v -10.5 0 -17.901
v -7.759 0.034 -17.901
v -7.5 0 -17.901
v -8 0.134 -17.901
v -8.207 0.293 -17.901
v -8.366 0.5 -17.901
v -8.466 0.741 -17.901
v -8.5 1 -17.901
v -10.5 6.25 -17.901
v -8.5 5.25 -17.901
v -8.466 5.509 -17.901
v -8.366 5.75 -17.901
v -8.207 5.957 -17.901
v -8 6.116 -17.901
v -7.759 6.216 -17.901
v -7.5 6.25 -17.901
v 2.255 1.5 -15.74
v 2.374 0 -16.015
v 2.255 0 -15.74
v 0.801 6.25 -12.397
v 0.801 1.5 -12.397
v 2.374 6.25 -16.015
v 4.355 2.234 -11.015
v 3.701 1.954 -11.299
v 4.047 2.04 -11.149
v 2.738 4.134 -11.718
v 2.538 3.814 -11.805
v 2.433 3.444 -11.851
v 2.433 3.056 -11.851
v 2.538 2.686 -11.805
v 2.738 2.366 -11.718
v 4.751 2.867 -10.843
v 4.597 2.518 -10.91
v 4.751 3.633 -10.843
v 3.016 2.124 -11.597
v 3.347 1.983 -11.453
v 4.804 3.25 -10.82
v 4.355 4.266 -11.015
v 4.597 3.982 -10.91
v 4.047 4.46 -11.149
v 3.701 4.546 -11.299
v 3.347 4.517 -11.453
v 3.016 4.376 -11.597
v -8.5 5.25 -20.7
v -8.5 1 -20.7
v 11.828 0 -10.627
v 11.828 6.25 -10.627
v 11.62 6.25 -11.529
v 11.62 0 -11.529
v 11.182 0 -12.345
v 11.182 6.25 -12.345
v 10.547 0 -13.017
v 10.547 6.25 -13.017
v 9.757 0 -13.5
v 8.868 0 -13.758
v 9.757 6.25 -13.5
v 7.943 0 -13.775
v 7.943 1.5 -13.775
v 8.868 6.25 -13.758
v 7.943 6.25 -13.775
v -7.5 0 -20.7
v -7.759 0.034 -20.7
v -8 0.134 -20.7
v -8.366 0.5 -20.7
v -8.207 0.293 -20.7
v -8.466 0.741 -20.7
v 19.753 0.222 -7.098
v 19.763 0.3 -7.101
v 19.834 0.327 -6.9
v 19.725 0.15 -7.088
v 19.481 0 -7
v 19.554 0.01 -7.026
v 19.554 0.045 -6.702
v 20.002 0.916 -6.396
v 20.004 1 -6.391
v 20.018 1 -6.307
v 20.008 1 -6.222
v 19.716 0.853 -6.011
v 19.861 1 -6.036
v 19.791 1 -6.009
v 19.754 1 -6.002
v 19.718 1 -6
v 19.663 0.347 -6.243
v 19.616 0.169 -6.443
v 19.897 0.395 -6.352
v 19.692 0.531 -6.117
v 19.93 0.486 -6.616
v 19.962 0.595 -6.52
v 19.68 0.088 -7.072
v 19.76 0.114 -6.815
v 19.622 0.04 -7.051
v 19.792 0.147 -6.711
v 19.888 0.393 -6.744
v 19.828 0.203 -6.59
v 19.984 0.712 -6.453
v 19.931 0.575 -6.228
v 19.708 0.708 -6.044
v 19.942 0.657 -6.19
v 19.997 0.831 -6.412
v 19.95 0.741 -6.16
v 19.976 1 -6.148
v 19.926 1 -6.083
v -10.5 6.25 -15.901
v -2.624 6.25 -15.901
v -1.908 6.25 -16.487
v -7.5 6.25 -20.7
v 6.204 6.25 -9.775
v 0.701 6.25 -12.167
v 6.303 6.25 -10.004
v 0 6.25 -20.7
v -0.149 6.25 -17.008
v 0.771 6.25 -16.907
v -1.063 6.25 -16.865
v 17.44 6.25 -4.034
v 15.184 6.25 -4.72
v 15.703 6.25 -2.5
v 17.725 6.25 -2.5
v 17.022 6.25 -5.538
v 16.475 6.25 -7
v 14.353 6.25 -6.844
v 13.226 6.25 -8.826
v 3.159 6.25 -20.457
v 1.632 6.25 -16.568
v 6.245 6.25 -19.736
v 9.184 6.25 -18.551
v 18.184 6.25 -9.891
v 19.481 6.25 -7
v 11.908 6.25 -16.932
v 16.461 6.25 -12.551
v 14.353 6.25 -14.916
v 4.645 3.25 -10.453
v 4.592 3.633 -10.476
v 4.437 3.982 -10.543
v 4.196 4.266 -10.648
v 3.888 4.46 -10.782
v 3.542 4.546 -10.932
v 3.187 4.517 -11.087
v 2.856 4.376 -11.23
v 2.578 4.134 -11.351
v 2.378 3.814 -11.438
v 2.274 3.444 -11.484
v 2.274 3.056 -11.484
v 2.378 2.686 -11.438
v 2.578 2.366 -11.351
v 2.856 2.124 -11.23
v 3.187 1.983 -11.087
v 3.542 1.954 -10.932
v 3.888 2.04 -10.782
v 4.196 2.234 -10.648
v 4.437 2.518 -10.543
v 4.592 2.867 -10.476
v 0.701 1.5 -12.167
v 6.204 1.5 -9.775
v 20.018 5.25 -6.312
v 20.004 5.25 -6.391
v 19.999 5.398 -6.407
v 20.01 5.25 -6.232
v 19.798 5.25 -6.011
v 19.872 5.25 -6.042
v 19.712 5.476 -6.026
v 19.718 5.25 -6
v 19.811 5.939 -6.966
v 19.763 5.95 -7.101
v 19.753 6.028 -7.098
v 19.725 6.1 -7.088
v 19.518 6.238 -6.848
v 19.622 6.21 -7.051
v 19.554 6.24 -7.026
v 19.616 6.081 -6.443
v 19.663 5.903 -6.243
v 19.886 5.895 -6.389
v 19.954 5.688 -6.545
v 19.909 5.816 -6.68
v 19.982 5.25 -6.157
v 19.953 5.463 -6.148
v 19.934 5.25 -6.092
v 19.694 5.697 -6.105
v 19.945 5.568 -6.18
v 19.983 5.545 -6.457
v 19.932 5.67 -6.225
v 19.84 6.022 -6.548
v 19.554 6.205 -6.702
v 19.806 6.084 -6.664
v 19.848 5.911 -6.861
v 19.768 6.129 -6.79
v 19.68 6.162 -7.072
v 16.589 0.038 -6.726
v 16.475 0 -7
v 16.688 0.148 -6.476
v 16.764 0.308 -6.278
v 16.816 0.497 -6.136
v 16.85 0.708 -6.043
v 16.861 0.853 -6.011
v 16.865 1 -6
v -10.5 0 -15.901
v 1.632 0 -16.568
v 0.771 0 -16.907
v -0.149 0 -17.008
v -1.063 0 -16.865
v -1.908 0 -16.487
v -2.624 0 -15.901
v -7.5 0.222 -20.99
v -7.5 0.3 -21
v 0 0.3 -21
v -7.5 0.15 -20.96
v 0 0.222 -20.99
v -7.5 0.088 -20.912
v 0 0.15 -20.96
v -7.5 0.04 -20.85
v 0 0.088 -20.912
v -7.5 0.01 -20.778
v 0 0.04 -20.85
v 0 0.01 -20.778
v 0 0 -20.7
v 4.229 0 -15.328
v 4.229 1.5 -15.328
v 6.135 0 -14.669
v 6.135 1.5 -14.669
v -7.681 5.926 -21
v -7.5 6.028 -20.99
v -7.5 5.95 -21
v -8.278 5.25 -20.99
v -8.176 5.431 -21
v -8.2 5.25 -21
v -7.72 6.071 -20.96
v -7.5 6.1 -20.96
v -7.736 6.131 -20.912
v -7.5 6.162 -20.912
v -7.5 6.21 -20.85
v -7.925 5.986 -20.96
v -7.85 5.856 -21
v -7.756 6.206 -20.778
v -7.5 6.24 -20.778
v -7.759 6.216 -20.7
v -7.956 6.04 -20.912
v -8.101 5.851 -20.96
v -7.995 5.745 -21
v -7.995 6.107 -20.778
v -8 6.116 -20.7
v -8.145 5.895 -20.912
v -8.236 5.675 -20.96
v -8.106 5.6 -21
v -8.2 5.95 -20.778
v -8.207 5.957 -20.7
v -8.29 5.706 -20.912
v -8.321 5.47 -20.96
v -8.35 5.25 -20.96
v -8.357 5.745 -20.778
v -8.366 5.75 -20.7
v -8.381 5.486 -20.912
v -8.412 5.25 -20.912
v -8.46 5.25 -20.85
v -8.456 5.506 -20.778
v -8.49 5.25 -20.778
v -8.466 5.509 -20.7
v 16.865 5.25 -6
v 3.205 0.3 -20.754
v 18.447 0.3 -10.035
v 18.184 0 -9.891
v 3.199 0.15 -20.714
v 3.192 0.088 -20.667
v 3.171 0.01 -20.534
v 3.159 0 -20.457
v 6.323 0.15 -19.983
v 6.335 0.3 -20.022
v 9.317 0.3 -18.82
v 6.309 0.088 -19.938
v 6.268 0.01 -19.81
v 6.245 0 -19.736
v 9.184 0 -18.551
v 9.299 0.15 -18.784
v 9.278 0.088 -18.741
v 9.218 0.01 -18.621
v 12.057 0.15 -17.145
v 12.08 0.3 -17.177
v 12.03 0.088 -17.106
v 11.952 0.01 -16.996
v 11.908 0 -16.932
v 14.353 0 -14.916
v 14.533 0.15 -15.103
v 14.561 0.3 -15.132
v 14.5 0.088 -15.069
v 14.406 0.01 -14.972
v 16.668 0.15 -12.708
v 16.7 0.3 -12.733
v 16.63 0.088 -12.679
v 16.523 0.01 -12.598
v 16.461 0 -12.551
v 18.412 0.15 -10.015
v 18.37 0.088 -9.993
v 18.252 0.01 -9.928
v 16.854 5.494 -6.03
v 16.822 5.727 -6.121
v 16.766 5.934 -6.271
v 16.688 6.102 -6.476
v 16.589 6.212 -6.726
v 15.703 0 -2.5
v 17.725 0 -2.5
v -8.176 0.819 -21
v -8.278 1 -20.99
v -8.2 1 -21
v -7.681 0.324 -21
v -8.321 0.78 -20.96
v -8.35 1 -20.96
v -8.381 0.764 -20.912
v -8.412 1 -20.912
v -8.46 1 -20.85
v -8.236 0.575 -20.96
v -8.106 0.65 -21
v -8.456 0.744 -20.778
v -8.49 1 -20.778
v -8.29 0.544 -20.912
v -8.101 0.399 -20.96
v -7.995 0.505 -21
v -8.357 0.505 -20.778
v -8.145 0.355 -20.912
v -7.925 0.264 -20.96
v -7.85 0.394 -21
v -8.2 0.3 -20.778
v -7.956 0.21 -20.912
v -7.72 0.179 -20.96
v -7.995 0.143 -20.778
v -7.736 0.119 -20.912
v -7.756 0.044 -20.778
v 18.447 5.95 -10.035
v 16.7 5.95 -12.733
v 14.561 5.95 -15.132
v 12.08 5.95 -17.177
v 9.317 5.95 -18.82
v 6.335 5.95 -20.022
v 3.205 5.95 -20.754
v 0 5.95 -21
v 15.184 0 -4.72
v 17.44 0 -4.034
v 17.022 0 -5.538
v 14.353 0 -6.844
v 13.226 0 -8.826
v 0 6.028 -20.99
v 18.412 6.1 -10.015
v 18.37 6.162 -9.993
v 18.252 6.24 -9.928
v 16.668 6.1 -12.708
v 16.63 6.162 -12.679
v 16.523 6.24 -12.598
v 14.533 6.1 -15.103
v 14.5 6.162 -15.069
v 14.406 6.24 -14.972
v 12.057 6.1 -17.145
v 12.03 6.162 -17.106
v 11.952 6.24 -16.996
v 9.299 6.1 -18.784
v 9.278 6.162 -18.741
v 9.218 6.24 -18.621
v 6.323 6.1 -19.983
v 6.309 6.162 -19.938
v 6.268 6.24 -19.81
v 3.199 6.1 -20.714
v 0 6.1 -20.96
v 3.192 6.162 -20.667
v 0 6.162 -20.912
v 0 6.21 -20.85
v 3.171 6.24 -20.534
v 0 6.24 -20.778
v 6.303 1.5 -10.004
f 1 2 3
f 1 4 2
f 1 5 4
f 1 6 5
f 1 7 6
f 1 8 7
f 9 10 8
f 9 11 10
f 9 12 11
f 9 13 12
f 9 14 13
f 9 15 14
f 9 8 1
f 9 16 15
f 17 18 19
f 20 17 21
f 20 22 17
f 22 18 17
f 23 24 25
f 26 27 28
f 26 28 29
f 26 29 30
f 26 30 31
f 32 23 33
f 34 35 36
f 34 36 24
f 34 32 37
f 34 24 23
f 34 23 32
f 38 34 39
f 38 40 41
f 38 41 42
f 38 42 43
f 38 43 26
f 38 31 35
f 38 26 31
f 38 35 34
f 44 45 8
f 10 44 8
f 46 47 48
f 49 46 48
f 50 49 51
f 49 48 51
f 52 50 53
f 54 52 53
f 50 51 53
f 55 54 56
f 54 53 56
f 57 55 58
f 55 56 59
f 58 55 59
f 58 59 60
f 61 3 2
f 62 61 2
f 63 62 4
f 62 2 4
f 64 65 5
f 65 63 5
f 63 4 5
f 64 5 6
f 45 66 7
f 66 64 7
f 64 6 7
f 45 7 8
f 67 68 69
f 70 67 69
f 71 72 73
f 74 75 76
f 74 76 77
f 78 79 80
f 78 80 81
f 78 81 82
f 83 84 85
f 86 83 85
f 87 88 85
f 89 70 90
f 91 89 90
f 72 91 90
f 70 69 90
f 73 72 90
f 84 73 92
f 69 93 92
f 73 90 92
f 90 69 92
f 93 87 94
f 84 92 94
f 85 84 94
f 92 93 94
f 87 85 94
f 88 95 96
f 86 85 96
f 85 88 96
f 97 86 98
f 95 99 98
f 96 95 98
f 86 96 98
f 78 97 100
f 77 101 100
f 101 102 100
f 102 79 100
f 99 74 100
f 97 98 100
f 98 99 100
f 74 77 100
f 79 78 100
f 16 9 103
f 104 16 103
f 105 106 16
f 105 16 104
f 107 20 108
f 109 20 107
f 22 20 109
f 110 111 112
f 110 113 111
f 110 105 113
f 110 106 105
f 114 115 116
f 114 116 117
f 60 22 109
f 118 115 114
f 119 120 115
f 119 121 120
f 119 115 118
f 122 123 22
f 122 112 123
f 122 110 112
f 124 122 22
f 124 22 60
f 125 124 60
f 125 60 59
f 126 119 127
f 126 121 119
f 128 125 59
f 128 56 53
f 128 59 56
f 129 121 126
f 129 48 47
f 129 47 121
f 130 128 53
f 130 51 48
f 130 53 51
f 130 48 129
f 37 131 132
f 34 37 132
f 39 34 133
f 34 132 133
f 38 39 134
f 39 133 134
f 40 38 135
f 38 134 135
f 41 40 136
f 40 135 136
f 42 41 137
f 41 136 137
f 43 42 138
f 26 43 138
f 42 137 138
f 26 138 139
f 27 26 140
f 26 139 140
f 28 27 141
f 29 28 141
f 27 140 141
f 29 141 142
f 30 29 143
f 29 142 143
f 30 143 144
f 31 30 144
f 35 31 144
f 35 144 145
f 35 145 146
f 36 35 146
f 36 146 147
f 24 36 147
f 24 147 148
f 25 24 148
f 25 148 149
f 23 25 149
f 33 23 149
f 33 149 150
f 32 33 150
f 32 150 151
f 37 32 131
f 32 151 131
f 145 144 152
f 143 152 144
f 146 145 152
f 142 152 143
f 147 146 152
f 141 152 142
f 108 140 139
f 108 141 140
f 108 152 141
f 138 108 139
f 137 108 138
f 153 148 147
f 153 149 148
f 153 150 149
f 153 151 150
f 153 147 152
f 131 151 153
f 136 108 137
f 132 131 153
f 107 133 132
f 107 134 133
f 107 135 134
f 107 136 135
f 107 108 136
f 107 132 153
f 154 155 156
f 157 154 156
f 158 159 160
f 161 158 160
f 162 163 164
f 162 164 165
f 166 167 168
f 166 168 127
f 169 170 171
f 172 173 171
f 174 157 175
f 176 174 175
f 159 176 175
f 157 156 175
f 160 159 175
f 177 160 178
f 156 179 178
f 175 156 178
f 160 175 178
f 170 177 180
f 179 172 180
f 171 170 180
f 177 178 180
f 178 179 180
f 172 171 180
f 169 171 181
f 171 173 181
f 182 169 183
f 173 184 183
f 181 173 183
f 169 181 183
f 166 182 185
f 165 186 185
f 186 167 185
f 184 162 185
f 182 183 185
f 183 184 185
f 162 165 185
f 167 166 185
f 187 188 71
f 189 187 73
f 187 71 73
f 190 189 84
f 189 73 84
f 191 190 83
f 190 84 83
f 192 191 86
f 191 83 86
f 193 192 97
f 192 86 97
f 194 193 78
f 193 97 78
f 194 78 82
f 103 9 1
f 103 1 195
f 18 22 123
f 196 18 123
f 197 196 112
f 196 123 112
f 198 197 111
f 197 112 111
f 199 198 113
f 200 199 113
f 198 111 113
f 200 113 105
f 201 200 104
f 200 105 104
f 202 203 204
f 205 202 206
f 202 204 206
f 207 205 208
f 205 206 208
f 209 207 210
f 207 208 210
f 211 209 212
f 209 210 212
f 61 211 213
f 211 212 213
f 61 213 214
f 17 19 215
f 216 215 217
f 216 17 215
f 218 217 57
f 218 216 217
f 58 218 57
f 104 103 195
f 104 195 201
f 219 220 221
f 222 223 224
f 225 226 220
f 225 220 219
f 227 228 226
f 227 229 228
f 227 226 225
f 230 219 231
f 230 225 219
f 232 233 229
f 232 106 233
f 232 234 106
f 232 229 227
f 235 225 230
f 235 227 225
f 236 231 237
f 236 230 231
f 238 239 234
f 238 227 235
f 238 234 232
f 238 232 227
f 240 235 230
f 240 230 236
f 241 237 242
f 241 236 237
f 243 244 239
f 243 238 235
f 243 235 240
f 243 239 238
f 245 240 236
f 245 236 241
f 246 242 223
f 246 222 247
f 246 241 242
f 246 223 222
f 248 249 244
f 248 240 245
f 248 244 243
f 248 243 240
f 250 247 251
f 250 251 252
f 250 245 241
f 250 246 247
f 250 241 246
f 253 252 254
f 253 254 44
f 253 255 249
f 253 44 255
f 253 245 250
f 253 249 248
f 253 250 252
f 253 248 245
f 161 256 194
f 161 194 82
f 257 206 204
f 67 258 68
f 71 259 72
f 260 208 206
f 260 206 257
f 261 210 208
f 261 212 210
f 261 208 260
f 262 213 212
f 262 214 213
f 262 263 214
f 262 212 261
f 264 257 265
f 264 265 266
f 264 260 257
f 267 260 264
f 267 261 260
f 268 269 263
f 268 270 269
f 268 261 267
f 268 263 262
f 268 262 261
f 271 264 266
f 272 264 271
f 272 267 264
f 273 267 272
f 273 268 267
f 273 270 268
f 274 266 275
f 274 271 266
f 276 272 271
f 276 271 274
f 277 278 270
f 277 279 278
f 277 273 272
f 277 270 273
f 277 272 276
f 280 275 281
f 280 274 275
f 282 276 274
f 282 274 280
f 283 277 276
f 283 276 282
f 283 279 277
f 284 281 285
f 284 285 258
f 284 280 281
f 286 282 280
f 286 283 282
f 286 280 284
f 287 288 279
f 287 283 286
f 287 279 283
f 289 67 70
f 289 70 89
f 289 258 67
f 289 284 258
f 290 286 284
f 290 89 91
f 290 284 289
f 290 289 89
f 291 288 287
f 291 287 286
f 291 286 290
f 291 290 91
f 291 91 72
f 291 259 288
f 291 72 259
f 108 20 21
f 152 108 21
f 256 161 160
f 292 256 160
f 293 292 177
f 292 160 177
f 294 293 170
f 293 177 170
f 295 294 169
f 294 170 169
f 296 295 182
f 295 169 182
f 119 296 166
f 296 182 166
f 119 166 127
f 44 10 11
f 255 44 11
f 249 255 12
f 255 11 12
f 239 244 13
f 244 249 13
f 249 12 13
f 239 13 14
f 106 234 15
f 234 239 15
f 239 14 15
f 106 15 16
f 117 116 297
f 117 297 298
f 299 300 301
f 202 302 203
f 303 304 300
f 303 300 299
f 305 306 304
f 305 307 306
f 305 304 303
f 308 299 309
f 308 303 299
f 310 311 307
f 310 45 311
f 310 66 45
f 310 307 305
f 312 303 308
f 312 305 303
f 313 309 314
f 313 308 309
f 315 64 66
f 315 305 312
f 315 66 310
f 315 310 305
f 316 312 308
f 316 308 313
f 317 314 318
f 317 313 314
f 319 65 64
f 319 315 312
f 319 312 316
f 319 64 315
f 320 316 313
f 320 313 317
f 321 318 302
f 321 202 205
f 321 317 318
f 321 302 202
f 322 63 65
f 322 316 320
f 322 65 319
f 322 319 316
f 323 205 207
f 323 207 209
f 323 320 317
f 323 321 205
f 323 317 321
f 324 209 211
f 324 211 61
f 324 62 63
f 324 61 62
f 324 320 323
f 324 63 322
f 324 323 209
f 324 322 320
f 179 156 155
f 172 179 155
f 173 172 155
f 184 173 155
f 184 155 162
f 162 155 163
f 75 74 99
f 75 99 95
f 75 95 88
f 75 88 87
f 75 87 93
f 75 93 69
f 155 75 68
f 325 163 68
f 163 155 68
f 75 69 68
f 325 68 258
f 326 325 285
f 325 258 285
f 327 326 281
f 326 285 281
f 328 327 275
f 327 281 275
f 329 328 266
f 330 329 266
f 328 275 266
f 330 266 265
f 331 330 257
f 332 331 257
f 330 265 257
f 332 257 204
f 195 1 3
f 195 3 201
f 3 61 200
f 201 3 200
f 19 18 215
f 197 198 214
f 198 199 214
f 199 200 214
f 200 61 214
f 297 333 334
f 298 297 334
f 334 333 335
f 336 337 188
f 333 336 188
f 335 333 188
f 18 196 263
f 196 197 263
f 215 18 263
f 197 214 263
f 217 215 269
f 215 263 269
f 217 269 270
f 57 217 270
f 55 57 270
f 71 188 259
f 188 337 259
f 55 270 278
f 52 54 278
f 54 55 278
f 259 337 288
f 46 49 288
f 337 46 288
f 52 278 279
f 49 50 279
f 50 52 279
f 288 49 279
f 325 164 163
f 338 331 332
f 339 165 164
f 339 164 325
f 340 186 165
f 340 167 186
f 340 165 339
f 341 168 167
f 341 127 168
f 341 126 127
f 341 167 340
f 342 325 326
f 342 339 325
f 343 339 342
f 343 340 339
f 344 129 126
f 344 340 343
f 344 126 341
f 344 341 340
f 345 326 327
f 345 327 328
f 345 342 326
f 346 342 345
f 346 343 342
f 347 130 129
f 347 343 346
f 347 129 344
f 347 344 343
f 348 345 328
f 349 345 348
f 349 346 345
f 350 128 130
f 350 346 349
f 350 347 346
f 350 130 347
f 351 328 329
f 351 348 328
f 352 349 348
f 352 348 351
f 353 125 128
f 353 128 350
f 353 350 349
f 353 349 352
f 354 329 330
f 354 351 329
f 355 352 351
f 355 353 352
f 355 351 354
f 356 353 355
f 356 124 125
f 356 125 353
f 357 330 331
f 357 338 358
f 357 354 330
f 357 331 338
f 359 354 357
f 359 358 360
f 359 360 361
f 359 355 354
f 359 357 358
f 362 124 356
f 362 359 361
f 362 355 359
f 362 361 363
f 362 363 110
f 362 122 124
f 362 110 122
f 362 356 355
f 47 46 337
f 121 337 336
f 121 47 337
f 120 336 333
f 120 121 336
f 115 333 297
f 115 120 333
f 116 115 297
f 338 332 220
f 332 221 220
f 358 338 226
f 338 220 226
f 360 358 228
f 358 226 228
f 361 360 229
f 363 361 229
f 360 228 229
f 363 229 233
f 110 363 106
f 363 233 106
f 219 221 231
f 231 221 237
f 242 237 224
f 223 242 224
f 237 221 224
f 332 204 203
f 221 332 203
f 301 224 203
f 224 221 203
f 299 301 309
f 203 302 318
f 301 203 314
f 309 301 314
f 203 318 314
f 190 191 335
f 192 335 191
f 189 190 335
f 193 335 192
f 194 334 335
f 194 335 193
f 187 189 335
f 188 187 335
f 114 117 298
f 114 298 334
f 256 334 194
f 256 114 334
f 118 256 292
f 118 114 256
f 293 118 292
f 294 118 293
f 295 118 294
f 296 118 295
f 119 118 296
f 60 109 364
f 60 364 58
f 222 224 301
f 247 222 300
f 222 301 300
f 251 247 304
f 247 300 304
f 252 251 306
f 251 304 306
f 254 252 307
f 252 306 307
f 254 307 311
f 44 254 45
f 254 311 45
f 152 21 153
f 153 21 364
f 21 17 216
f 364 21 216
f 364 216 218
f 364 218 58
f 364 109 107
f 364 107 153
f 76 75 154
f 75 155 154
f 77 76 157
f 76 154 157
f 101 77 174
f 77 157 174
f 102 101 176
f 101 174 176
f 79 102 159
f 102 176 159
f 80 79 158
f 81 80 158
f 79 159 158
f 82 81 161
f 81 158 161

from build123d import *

# Parameters (mm, degrees)
BOSS_EXTRUDE1_DEPTH = 6.25
CUT_EXTRUDE1_DEPTH  = 10
BOSS_EXTRUDE2_DEPTH = 6.25
CUT_EXTRUDE2_START  = -1.5
CUT_EXTRUDE2_DEPTH  = 1.5
MOVE_FACE1_BY       = 0.25
SKETCH5_R           = 1.3
CUT_EXTRUDE3_DEPTH  = 0.4
BOSS_EXTRUDE3_DEPTH = 6.25
MOVE_FACE2_BY       = 0.5
MOVE_FACE2_2_BY     = 0.5
CUT_EXTRUDE4_DEPTH  = 13
CUT_EXTRUDE5_START  = -1.5
CUT_EXTRUDE5_DEPTH  = 1.5
BOSS_EXTRUDE4_DEPTH = 6.25
CUT_EXTRUDE6_DEPTH  = 9.000000000000002
FILLET1_R           = 1
FILLET2_R           = 0.3


with BuildPart() as part:
    # Sketch1 → Boss-Extrude1 (new body)
    with BuildSketch(Plane(origin=(0, 0, 0), x_dir=(1, 0, 0), z_dir=(0, 1, 0))):
        with BuildLine():
            Line((-8.500000000000007, 21.49999999999999), (-8.500000000000007, 15.499999999999982))
            Line((-8.500000000000007, 15.499999999999982), (16.645822822062563, 5.999999999999995))
            Line((16.645822822062563, 5.999999999999995), (20.645822822062566, 5.999999999999995))
            ThreePointArc((20.645822822062566, 5.999999999999995), (12.90833064342558, 17.19374886404939), (0, 21.49999999999999))
            Line((0, 21.49999999999999), (-8.500000000000007, 21.49999999999999))
        make_face()
    extrude(amount=BOSS_EXTRUDE1_DEPTH)

    # Sketch2 → Cut-Extrude1 (cut)
    with BuildSketch(Plane(origin=(0, 6.25, 0), x_dir=(1, 0, 0), z_dir=(0, 1, 0))):
        with BuildLine():
            Line((-9.752670250943163, 2.7674418604651105), (-9.752670250943163, 14.499999999999986))
            Line((-9.752670250943163, 14.499999999999986), (8.3e-16, 14.499999999999986))
            ThreePointArc((8.3e-16, 14.499999999999986), (9.22285457500159, 11.188786953390961), (14.233455854041384, 2.7674418604651105))
            Line((14.233455854041384, 2.7674418604651105), (-9.752670250943163, 2.7674418604651105))
        make_face()
    extrude(amount=-CUT_EXTRUDE1_DEPTH, mode=Mode.SUBTRACT)

    # Sketch3 → Boss-Extrude2 (add)
    with BuildSketch(Plane(origin=(0, 6.25, 0), x_dir=(1, 0, 0), z_dir=(0, 1, 0))):
        Polygon((4.469156931645221, 10.801748174518188), (6.3032770804154685, 10.004250036667695), (8.404211615552752, 14.836068669534448), (2.8125557708062745, 17.02319772649103), (0.8009166341047183, 12.396744450219176), (2.6350367828749666, 11.599246312368683), align=None)
    extrude(amount=-BOSS_EXTRUDE2_DEPTH)

    # Sketch4 → Cut-Extrude2 (cut)
    with BuildSketch(Plane.XZ.offset(CUT_EXTRUDE2_START)):
        with BuildLine():
            Line((12.329816757236909, -7.63057132415126), (4.858273185949837, -3.0066464723283906))
            Line((4.858273185949837, -3.0066464723283906), (-2.1755255087838874, -6.757515163827213))
            Line((-2.1755255087838874, -6.757515163827213), (0.39188162426461154, -14.49470347377149))
            ThreePointArc((0.39188162426461154, -14.49470347377149), (7.227688425031692, -12.570223547362334), (12.329816757236909, -7.63057132415126))
        make_face()
    extrude(amount=CUT_EXTRUDE2_DEPTH, mode=Mode.SUBTRACT)

    # Move Face1: a face moved outward by 0.25
    extrude(part.faces().sort_by_distance((3.552096857, 3.875, -11.200497243))[0], amount=MOVE_FACE1_BY, dir=(-0.398749069, 0, 0.917060074))

    # Sketch5 → Cut-Extrude3 (cut)
    with BuildSketch(Plane(origin=(4.560861605165302, 0, -10.489263571615414), x_dir=(0.917060074385124, 0, 0.3987490689252462), z_dir=(-0.3987490689252462, 0, 0.917060074385124))):
        with Locations((-1.20870163918075, 3.2500000000000084)):
            Circle(SKETCH5_R)
    extrude(amount=-CUT_EXTRUDE3_DEPTH, mode=Mode.SUBTRACT)

    # Sketch6 → Boss-Extrude3 (add)
    with BuildSketch(Plane(origin=(0, 6.25, 0), x_dir=(1, 0, 0), z_dir=(0, 1, 0))):
        Polygon((-8.500000000000007, 15.900685410943252), (-8.398385997633637, 15.900685410943252), (-8.398385997633637, 17.900685410943254), (-8.500000000000007, 17.900685410943254), (-10.500000000000009, 17.900685410943254), (-10.500000000000009, 15.900685410943252), align=None)
    extrude(amount=-BOSS_EXTRUDE3_DEPTH)

    # Move Face2: a face moved inward by 0.5
    extrude(part.faces().sort_by_distance((-4.25, 3.125, -21.5))[0], amount=MOVE_FACE2_BY, dir=(0, 0, 1), mode=Mode.SUBTRACT)

    # Move Face2 2: a curved face moved inward by 0.5
    add(Solid.thicken(part.faces().sort_by_distance((12.908330643, 3.125, -17.193748864))[0], -MOVE_FACE2_2_BY), mode=Mode.SUBTRACT)

    # Sketch7 → Cut-Extrude4 (cut)
    with BuildSketch(Plane(origin=(0, 6.25, 0), x_dir=(1, 0, 0), z_dir=(0, 1, 0))):
        with BuildLine():
            Line((-8.500000000000007, 15.900685410943252), (0, 15.900685410943252))
            ThreePointArc((0, 15.900685410943252), (1.1301672935759872, 15.860470309114884), (2.2546178785171396, 15.740028423089157))
            Line((2.2546178785171396, 15.740028423089157), (1.4365096738849472, 13.858508365832973))
            Line((1.4365096738849472, 13.858508365832973), (0.7012293668734065, 12.167479431622894))
            Line((0.7012293668734065, 12.167479431622894), (6.203589813184157, 9.774985018071414))
            Line((6.203589813184157, 9.774985018071414), (7.238188726101288, 12.15439961732261))
            Line((7.238188726101288, 12.15439961732261), (7.94274956604829, 13.774778614149243))
            ThreePointArc((7.94274956604829, 13.774778614149243), (13.653169200208351, 8.150016400490594), (15.89419526397822, 0.45426143168428607))
            Line((15.89419526397822, 0.45426143168428607), (-20.808588691152597, -0.594716444159659))
            Line((-20.808588691152597, -0.594716444159659), (-15.374732718008488, 14.86339738490728))
            Line((-15.374732718008488, 14.86339738490728), (-8.500000000000007, 15.900685410943252))
        make_face()
    extrude(amount=-CUT_EXTRUDE4_DEPTH, mode=Mode.SUBTRACT)

    # Sketch8 → Cut-Extrude5 (cut)
    with BuildSketch(Plane.XZ.offset(CUT_EXTRUDE5_START)):
        with BuildLine():
            Line((14.339308110473954, -6.871392831928589), (1.9043764034639075, -3.0604478341676384))
            Line((1.9043764034639075, -3.0604478341676384), (-4.2629376925202305, -10.324173324993405))
            Line((-4.2629376925202305, -10.324173324993405), (0.7554626751993575, -15.882728754347104))
            ThreePointArc((0.7554626751993575, -15.882728754347104), (8.789998296056245, -13.250197224687337), (14.339308110473954, -6.871392831928589))
        make_face()
    extrude(amount=CUT_EXTRUDE5_DEPTH, mode=Mode.SUBTRACT)

    # Sketch9 → Boss-Extrude4 (add)
    with BuildSketch(Plane(origin=(0, 6.25, 0), x_dir=(1, 0, 0), z_dir=(0, 1, 0))):
        with BuildLine():
            Line((15.70292318448331, 2.500000000000002), (17.725251454235494, 2.500000000000002))
            ThreePointArc((17.725251454235494, 2.500000000000002), (16.78932753436898, 6.209107831207082), (15.086677514257817, 9.634661420966763))
            Line((15.086677514257817, 9.634661420966763), (13.225064123719731, 8.827767297640147))
            ThreePointArc((13.225064123719731, 8.827767297640147), (14.805987713393527, 5.797803408931993), (15.70292318448331, 2.500000000000002))
        make_face()
    extrude(amount=-BOSS_EXTRUDE4_DEPTH)

    # Sketch11 → Cut-Extrude6 (cut)
    with BuildSketch(Plane(origin=(0, 6.25, 0), x_dir=(1, 0, 0), z_dir=(0, 1, 0))):
        with BuildLine():
            Line((7.94274956604829, 13.774778614149243), (11.827692426009557, 10.627205108282226))
            ThreePointArc((11.827692426009557, 10.627205108282226), (10.546532646680365, 13.017226325833846), (7.94274956604829, 13.774778614149243))
        make_face()
        with BuildLine():
            Line((0.7012293668734065, 12.167479431622894), (2.2546178785171413, 15.740028423089157))
            Line((2.2546178785171413, 15.740028423089157), (2.374242599194715, 16.015146445404692))
            ThreePointArc((2.374242599194715, 16.015146445404692), (-0.14915074669056683, 17.00815088772086), (-2.6244470962744906, 15.900685410943252))
            Line((-2.6244470962744906, 15.900685410943252), (0.7012293668734065, 12.167479431622894))
        make_face()
    extrude(amount=-CUT_EXTRUDE6_DEPTH, mode=Mode.SUBTRACT)

    # Fillet1
    fillet1_edges = [part.edges().sort_by_distance(p)[0] for p in [
        (-8.500000000000007, 6.25, -19.45034270547162),
        (18.49489949615255, 0, -5.999999999999995),
        (18.49489949615255, 6.25, -5.999999999999995),
        (-8.500000000000007, 0, -19.45034270547162),
    ]]
    fillet(fillet1_edges, radius=FILLET1_R)

    # Fillet2
    fillet2_edges = [part.edges().sort_by_distance(p)[0] for p in [
        (12.124355652982135, 6.25, -17.146428199482237),
        (-8.500000000000007, 3.1249999999999996, -20.99999999999999),
        (-8.207106781186555, 0.2928932188134522, -20.99999999999999),
        (-8.207106781186555, 5.957106781186548, -20.99999999999999),
        (12.124355652982135, 0, -17.146428199482237),
        (20.124611797498098, 3.125, -5.999999999999995),
        (20.031843616518877, 5.96687308089546, -6.302796311029798),
        (20.03184361651888, 0.2831269191045398, -6.302796311029798),
        (-3.7500000000000036, 0, -20.99999999999999),
        (-3.7500000000000036, 6.25, -20.99999999999999),
    ]]
    fillet(fillet2_edges, radius=FILLET2_R)


solid = part.part
